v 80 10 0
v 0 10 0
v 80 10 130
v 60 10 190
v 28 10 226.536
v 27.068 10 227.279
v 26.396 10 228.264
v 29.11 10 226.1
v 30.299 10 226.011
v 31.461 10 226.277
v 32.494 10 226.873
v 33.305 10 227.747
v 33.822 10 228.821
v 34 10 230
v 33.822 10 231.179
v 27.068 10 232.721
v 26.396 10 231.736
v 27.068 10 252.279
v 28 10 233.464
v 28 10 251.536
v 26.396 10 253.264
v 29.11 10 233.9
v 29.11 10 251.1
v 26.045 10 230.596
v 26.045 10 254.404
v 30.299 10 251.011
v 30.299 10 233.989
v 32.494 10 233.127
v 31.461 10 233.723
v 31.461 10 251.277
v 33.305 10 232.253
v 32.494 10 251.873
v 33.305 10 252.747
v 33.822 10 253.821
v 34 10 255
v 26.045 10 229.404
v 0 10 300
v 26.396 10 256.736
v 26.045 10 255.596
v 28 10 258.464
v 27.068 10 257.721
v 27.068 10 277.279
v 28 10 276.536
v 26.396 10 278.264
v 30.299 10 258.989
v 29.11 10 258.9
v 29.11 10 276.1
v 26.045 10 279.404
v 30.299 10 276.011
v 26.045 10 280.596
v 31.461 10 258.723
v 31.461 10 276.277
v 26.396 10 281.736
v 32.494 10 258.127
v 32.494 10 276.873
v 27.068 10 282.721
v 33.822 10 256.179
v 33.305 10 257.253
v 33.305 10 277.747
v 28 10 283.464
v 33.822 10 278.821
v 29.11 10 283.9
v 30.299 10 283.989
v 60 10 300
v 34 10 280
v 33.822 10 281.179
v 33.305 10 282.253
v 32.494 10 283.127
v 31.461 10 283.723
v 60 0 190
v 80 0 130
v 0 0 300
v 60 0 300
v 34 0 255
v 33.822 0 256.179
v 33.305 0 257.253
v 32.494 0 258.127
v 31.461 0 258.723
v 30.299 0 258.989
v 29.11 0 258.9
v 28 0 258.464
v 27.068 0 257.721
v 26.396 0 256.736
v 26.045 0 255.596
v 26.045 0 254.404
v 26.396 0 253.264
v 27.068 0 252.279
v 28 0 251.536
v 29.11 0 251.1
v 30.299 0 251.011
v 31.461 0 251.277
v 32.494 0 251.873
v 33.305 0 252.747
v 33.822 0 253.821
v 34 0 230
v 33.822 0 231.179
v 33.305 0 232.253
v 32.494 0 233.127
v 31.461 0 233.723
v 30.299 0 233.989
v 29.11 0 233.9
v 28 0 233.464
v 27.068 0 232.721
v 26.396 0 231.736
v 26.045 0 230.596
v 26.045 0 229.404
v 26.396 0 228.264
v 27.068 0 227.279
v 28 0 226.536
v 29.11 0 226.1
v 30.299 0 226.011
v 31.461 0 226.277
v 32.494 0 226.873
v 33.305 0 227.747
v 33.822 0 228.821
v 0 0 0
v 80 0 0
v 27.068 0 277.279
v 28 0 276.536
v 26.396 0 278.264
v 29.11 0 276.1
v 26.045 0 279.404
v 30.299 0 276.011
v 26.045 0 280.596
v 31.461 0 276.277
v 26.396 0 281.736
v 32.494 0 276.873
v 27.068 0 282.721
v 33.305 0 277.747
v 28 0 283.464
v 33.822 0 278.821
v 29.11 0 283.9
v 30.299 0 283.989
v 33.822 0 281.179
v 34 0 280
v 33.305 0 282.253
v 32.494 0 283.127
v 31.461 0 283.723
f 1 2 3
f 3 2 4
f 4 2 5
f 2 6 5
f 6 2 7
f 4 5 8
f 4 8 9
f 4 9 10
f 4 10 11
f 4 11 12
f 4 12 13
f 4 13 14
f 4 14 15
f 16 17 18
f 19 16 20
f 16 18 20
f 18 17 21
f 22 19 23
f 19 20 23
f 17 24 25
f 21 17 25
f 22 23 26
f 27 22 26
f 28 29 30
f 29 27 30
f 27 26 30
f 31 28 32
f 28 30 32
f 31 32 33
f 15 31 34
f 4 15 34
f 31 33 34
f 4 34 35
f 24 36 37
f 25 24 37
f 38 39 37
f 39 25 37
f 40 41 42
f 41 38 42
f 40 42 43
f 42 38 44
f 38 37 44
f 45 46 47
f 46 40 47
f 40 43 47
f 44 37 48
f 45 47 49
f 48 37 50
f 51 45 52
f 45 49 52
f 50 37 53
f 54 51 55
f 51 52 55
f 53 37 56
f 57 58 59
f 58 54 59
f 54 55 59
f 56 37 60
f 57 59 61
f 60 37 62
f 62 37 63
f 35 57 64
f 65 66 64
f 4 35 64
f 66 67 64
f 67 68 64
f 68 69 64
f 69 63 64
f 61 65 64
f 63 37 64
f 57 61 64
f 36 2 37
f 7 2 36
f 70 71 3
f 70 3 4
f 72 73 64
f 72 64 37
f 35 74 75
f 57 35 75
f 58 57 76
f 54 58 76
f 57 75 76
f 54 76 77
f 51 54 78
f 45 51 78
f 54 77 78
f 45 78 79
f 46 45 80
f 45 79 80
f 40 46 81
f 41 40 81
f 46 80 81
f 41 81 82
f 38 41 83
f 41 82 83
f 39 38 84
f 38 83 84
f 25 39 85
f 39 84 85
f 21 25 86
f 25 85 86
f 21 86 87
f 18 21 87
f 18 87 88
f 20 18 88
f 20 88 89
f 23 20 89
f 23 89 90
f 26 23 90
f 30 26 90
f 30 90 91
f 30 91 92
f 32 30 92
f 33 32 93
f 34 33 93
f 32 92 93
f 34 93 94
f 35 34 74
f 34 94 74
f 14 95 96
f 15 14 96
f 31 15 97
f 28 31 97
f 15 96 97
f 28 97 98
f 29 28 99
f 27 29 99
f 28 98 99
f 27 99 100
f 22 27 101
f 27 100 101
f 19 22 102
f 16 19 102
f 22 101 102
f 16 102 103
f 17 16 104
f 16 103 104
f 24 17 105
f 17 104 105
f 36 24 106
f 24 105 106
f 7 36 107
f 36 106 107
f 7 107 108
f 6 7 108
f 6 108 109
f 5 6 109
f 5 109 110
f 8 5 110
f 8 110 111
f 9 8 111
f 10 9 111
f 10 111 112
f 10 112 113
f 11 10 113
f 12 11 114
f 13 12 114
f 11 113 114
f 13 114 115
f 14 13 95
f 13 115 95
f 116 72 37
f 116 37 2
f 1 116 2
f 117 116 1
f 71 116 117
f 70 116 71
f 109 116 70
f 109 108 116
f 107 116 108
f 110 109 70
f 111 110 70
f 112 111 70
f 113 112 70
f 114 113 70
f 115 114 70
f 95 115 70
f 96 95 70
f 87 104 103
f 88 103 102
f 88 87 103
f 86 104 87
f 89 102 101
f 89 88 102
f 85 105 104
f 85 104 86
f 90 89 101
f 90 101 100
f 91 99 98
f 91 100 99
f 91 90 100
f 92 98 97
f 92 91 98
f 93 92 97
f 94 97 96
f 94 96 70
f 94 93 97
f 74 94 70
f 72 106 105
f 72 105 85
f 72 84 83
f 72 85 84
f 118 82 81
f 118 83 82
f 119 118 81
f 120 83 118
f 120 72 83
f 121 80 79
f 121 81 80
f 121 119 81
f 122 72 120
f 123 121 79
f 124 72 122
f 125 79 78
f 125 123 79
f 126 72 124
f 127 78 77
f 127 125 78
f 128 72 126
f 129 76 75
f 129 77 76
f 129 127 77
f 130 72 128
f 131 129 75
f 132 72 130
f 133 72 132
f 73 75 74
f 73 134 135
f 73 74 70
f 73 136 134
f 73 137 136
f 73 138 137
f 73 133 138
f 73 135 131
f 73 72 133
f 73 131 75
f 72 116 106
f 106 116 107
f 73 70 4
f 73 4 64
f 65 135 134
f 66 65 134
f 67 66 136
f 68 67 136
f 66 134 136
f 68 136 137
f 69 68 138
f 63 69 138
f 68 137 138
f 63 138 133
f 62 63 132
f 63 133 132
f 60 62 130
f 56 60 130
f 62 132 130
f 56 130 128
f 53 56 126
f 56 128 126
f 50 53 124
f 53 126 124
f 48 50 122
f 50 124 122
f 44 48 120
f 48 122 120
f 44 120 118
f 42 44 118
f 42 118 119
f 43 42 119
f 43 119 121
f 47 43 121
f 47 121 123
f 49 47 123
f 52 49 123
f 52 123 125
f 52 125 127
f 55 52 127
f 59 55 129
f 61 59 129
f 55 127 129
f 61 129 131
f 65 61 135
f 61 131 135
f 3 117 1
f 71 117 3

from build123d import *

# Parameters (mm, degrees)
F0_R     = 4
F1_DEPTH = 10


with BuildPart() as f1:
    # F0 (on Front) → F1 (new body)
    with BuildSketch(Plane.XZ):
        Polygon((0, 300), (0, 0), (80, 0), (80, 130), (60, 190), (60, 300), align=None)
        with Locations((30, 230)):
            Circle(F0_R, mode=Mode.SUBTRACT)
        with Locations((30, 255)):
            Circle(F0_R, mode=Mode.SUBTRACT)
        with Locations((30, 280)):
            Circle(F0_R, mode=Mode.SUBTRACT)
    extrude(amount=-F1_DEPTH)


solid = f1.part
